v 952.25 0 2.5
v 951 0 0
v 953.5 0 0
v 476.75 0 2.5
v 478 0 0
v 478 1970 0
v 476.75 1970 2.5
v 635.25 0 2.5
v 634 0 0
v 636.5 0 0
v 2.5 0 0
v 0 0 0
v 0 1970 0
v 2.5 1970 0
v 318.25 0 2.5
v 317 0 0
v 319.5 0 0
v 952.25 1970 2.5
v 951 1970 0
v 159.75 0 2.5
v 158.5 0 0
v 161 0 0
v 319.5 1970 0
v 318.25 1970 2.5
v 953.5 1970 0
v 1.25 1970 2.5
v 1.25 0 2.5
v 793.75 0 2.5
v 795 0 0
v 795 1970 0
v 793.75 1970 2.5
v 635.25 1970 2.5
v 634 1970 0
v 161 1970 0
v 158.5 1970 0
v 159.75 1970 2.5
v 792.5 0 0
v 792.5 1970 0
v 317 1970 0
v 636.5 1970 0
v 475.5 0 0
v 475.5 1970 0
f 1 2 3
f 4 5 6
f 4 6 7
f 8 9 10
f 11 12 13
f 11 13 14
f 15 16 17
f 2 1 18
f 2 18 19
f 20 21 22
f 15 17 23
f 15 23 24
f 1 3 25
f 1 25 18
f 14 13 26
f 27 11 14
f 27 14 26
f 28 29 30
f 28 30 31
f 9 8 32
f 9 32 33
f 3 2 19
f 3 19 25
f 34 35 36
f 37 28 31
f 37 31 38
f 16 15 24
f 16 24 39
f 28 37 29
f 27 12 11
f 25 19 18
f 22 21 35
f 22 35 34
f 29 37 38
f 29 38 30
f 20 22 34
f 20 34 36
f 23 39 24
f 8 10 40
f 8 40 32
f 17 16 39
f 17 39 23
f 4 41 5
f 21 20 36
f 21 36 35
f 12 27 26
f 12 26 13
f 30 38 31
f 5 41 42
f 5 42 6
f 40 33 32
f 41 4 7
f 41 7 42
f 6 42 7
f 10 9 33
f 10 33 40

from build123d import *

# Parameters (mm, degrees)
F1_DEPTH = 1970
F2_DEPTH = 1970


with BuildPart() as f1:
    # F0 (on Front) → F1 (new body)
    with BuildSketch(Plane.XZ):
        Polygon((1.25, 2.5), (0, 0), (2.5, 0), align=None)
    extrude(amount=-F1_DEPTH)

    # F0 (on Front) → F2 (join)
    with BuildSketch(Plane.XZ):
        Polygon((1.25, 2.5), (0, 0), (2.5, 0), align=None)
        Polygon((158.5, 0), (161, 0), (159.75, 2.5), align=None)
        Polygon((317, 0), (319.5, 0), (318.25, 2.5), align=None)
        Polygon((475.5, 0), (478, 0), (476.75, 2.5), align=None)
        Polygon((634, 0), (636.5, 0), (635.25, 2.5), align=None)
        Polygon((792.5, 0), (795, 0), (793.75, 2.5), align=None)
        Polygon((951, 0), (953.5, 0), (952.25, 2.5), align=None)
    extrude(amount=-F2_DEPTH)


solid = f1.part
